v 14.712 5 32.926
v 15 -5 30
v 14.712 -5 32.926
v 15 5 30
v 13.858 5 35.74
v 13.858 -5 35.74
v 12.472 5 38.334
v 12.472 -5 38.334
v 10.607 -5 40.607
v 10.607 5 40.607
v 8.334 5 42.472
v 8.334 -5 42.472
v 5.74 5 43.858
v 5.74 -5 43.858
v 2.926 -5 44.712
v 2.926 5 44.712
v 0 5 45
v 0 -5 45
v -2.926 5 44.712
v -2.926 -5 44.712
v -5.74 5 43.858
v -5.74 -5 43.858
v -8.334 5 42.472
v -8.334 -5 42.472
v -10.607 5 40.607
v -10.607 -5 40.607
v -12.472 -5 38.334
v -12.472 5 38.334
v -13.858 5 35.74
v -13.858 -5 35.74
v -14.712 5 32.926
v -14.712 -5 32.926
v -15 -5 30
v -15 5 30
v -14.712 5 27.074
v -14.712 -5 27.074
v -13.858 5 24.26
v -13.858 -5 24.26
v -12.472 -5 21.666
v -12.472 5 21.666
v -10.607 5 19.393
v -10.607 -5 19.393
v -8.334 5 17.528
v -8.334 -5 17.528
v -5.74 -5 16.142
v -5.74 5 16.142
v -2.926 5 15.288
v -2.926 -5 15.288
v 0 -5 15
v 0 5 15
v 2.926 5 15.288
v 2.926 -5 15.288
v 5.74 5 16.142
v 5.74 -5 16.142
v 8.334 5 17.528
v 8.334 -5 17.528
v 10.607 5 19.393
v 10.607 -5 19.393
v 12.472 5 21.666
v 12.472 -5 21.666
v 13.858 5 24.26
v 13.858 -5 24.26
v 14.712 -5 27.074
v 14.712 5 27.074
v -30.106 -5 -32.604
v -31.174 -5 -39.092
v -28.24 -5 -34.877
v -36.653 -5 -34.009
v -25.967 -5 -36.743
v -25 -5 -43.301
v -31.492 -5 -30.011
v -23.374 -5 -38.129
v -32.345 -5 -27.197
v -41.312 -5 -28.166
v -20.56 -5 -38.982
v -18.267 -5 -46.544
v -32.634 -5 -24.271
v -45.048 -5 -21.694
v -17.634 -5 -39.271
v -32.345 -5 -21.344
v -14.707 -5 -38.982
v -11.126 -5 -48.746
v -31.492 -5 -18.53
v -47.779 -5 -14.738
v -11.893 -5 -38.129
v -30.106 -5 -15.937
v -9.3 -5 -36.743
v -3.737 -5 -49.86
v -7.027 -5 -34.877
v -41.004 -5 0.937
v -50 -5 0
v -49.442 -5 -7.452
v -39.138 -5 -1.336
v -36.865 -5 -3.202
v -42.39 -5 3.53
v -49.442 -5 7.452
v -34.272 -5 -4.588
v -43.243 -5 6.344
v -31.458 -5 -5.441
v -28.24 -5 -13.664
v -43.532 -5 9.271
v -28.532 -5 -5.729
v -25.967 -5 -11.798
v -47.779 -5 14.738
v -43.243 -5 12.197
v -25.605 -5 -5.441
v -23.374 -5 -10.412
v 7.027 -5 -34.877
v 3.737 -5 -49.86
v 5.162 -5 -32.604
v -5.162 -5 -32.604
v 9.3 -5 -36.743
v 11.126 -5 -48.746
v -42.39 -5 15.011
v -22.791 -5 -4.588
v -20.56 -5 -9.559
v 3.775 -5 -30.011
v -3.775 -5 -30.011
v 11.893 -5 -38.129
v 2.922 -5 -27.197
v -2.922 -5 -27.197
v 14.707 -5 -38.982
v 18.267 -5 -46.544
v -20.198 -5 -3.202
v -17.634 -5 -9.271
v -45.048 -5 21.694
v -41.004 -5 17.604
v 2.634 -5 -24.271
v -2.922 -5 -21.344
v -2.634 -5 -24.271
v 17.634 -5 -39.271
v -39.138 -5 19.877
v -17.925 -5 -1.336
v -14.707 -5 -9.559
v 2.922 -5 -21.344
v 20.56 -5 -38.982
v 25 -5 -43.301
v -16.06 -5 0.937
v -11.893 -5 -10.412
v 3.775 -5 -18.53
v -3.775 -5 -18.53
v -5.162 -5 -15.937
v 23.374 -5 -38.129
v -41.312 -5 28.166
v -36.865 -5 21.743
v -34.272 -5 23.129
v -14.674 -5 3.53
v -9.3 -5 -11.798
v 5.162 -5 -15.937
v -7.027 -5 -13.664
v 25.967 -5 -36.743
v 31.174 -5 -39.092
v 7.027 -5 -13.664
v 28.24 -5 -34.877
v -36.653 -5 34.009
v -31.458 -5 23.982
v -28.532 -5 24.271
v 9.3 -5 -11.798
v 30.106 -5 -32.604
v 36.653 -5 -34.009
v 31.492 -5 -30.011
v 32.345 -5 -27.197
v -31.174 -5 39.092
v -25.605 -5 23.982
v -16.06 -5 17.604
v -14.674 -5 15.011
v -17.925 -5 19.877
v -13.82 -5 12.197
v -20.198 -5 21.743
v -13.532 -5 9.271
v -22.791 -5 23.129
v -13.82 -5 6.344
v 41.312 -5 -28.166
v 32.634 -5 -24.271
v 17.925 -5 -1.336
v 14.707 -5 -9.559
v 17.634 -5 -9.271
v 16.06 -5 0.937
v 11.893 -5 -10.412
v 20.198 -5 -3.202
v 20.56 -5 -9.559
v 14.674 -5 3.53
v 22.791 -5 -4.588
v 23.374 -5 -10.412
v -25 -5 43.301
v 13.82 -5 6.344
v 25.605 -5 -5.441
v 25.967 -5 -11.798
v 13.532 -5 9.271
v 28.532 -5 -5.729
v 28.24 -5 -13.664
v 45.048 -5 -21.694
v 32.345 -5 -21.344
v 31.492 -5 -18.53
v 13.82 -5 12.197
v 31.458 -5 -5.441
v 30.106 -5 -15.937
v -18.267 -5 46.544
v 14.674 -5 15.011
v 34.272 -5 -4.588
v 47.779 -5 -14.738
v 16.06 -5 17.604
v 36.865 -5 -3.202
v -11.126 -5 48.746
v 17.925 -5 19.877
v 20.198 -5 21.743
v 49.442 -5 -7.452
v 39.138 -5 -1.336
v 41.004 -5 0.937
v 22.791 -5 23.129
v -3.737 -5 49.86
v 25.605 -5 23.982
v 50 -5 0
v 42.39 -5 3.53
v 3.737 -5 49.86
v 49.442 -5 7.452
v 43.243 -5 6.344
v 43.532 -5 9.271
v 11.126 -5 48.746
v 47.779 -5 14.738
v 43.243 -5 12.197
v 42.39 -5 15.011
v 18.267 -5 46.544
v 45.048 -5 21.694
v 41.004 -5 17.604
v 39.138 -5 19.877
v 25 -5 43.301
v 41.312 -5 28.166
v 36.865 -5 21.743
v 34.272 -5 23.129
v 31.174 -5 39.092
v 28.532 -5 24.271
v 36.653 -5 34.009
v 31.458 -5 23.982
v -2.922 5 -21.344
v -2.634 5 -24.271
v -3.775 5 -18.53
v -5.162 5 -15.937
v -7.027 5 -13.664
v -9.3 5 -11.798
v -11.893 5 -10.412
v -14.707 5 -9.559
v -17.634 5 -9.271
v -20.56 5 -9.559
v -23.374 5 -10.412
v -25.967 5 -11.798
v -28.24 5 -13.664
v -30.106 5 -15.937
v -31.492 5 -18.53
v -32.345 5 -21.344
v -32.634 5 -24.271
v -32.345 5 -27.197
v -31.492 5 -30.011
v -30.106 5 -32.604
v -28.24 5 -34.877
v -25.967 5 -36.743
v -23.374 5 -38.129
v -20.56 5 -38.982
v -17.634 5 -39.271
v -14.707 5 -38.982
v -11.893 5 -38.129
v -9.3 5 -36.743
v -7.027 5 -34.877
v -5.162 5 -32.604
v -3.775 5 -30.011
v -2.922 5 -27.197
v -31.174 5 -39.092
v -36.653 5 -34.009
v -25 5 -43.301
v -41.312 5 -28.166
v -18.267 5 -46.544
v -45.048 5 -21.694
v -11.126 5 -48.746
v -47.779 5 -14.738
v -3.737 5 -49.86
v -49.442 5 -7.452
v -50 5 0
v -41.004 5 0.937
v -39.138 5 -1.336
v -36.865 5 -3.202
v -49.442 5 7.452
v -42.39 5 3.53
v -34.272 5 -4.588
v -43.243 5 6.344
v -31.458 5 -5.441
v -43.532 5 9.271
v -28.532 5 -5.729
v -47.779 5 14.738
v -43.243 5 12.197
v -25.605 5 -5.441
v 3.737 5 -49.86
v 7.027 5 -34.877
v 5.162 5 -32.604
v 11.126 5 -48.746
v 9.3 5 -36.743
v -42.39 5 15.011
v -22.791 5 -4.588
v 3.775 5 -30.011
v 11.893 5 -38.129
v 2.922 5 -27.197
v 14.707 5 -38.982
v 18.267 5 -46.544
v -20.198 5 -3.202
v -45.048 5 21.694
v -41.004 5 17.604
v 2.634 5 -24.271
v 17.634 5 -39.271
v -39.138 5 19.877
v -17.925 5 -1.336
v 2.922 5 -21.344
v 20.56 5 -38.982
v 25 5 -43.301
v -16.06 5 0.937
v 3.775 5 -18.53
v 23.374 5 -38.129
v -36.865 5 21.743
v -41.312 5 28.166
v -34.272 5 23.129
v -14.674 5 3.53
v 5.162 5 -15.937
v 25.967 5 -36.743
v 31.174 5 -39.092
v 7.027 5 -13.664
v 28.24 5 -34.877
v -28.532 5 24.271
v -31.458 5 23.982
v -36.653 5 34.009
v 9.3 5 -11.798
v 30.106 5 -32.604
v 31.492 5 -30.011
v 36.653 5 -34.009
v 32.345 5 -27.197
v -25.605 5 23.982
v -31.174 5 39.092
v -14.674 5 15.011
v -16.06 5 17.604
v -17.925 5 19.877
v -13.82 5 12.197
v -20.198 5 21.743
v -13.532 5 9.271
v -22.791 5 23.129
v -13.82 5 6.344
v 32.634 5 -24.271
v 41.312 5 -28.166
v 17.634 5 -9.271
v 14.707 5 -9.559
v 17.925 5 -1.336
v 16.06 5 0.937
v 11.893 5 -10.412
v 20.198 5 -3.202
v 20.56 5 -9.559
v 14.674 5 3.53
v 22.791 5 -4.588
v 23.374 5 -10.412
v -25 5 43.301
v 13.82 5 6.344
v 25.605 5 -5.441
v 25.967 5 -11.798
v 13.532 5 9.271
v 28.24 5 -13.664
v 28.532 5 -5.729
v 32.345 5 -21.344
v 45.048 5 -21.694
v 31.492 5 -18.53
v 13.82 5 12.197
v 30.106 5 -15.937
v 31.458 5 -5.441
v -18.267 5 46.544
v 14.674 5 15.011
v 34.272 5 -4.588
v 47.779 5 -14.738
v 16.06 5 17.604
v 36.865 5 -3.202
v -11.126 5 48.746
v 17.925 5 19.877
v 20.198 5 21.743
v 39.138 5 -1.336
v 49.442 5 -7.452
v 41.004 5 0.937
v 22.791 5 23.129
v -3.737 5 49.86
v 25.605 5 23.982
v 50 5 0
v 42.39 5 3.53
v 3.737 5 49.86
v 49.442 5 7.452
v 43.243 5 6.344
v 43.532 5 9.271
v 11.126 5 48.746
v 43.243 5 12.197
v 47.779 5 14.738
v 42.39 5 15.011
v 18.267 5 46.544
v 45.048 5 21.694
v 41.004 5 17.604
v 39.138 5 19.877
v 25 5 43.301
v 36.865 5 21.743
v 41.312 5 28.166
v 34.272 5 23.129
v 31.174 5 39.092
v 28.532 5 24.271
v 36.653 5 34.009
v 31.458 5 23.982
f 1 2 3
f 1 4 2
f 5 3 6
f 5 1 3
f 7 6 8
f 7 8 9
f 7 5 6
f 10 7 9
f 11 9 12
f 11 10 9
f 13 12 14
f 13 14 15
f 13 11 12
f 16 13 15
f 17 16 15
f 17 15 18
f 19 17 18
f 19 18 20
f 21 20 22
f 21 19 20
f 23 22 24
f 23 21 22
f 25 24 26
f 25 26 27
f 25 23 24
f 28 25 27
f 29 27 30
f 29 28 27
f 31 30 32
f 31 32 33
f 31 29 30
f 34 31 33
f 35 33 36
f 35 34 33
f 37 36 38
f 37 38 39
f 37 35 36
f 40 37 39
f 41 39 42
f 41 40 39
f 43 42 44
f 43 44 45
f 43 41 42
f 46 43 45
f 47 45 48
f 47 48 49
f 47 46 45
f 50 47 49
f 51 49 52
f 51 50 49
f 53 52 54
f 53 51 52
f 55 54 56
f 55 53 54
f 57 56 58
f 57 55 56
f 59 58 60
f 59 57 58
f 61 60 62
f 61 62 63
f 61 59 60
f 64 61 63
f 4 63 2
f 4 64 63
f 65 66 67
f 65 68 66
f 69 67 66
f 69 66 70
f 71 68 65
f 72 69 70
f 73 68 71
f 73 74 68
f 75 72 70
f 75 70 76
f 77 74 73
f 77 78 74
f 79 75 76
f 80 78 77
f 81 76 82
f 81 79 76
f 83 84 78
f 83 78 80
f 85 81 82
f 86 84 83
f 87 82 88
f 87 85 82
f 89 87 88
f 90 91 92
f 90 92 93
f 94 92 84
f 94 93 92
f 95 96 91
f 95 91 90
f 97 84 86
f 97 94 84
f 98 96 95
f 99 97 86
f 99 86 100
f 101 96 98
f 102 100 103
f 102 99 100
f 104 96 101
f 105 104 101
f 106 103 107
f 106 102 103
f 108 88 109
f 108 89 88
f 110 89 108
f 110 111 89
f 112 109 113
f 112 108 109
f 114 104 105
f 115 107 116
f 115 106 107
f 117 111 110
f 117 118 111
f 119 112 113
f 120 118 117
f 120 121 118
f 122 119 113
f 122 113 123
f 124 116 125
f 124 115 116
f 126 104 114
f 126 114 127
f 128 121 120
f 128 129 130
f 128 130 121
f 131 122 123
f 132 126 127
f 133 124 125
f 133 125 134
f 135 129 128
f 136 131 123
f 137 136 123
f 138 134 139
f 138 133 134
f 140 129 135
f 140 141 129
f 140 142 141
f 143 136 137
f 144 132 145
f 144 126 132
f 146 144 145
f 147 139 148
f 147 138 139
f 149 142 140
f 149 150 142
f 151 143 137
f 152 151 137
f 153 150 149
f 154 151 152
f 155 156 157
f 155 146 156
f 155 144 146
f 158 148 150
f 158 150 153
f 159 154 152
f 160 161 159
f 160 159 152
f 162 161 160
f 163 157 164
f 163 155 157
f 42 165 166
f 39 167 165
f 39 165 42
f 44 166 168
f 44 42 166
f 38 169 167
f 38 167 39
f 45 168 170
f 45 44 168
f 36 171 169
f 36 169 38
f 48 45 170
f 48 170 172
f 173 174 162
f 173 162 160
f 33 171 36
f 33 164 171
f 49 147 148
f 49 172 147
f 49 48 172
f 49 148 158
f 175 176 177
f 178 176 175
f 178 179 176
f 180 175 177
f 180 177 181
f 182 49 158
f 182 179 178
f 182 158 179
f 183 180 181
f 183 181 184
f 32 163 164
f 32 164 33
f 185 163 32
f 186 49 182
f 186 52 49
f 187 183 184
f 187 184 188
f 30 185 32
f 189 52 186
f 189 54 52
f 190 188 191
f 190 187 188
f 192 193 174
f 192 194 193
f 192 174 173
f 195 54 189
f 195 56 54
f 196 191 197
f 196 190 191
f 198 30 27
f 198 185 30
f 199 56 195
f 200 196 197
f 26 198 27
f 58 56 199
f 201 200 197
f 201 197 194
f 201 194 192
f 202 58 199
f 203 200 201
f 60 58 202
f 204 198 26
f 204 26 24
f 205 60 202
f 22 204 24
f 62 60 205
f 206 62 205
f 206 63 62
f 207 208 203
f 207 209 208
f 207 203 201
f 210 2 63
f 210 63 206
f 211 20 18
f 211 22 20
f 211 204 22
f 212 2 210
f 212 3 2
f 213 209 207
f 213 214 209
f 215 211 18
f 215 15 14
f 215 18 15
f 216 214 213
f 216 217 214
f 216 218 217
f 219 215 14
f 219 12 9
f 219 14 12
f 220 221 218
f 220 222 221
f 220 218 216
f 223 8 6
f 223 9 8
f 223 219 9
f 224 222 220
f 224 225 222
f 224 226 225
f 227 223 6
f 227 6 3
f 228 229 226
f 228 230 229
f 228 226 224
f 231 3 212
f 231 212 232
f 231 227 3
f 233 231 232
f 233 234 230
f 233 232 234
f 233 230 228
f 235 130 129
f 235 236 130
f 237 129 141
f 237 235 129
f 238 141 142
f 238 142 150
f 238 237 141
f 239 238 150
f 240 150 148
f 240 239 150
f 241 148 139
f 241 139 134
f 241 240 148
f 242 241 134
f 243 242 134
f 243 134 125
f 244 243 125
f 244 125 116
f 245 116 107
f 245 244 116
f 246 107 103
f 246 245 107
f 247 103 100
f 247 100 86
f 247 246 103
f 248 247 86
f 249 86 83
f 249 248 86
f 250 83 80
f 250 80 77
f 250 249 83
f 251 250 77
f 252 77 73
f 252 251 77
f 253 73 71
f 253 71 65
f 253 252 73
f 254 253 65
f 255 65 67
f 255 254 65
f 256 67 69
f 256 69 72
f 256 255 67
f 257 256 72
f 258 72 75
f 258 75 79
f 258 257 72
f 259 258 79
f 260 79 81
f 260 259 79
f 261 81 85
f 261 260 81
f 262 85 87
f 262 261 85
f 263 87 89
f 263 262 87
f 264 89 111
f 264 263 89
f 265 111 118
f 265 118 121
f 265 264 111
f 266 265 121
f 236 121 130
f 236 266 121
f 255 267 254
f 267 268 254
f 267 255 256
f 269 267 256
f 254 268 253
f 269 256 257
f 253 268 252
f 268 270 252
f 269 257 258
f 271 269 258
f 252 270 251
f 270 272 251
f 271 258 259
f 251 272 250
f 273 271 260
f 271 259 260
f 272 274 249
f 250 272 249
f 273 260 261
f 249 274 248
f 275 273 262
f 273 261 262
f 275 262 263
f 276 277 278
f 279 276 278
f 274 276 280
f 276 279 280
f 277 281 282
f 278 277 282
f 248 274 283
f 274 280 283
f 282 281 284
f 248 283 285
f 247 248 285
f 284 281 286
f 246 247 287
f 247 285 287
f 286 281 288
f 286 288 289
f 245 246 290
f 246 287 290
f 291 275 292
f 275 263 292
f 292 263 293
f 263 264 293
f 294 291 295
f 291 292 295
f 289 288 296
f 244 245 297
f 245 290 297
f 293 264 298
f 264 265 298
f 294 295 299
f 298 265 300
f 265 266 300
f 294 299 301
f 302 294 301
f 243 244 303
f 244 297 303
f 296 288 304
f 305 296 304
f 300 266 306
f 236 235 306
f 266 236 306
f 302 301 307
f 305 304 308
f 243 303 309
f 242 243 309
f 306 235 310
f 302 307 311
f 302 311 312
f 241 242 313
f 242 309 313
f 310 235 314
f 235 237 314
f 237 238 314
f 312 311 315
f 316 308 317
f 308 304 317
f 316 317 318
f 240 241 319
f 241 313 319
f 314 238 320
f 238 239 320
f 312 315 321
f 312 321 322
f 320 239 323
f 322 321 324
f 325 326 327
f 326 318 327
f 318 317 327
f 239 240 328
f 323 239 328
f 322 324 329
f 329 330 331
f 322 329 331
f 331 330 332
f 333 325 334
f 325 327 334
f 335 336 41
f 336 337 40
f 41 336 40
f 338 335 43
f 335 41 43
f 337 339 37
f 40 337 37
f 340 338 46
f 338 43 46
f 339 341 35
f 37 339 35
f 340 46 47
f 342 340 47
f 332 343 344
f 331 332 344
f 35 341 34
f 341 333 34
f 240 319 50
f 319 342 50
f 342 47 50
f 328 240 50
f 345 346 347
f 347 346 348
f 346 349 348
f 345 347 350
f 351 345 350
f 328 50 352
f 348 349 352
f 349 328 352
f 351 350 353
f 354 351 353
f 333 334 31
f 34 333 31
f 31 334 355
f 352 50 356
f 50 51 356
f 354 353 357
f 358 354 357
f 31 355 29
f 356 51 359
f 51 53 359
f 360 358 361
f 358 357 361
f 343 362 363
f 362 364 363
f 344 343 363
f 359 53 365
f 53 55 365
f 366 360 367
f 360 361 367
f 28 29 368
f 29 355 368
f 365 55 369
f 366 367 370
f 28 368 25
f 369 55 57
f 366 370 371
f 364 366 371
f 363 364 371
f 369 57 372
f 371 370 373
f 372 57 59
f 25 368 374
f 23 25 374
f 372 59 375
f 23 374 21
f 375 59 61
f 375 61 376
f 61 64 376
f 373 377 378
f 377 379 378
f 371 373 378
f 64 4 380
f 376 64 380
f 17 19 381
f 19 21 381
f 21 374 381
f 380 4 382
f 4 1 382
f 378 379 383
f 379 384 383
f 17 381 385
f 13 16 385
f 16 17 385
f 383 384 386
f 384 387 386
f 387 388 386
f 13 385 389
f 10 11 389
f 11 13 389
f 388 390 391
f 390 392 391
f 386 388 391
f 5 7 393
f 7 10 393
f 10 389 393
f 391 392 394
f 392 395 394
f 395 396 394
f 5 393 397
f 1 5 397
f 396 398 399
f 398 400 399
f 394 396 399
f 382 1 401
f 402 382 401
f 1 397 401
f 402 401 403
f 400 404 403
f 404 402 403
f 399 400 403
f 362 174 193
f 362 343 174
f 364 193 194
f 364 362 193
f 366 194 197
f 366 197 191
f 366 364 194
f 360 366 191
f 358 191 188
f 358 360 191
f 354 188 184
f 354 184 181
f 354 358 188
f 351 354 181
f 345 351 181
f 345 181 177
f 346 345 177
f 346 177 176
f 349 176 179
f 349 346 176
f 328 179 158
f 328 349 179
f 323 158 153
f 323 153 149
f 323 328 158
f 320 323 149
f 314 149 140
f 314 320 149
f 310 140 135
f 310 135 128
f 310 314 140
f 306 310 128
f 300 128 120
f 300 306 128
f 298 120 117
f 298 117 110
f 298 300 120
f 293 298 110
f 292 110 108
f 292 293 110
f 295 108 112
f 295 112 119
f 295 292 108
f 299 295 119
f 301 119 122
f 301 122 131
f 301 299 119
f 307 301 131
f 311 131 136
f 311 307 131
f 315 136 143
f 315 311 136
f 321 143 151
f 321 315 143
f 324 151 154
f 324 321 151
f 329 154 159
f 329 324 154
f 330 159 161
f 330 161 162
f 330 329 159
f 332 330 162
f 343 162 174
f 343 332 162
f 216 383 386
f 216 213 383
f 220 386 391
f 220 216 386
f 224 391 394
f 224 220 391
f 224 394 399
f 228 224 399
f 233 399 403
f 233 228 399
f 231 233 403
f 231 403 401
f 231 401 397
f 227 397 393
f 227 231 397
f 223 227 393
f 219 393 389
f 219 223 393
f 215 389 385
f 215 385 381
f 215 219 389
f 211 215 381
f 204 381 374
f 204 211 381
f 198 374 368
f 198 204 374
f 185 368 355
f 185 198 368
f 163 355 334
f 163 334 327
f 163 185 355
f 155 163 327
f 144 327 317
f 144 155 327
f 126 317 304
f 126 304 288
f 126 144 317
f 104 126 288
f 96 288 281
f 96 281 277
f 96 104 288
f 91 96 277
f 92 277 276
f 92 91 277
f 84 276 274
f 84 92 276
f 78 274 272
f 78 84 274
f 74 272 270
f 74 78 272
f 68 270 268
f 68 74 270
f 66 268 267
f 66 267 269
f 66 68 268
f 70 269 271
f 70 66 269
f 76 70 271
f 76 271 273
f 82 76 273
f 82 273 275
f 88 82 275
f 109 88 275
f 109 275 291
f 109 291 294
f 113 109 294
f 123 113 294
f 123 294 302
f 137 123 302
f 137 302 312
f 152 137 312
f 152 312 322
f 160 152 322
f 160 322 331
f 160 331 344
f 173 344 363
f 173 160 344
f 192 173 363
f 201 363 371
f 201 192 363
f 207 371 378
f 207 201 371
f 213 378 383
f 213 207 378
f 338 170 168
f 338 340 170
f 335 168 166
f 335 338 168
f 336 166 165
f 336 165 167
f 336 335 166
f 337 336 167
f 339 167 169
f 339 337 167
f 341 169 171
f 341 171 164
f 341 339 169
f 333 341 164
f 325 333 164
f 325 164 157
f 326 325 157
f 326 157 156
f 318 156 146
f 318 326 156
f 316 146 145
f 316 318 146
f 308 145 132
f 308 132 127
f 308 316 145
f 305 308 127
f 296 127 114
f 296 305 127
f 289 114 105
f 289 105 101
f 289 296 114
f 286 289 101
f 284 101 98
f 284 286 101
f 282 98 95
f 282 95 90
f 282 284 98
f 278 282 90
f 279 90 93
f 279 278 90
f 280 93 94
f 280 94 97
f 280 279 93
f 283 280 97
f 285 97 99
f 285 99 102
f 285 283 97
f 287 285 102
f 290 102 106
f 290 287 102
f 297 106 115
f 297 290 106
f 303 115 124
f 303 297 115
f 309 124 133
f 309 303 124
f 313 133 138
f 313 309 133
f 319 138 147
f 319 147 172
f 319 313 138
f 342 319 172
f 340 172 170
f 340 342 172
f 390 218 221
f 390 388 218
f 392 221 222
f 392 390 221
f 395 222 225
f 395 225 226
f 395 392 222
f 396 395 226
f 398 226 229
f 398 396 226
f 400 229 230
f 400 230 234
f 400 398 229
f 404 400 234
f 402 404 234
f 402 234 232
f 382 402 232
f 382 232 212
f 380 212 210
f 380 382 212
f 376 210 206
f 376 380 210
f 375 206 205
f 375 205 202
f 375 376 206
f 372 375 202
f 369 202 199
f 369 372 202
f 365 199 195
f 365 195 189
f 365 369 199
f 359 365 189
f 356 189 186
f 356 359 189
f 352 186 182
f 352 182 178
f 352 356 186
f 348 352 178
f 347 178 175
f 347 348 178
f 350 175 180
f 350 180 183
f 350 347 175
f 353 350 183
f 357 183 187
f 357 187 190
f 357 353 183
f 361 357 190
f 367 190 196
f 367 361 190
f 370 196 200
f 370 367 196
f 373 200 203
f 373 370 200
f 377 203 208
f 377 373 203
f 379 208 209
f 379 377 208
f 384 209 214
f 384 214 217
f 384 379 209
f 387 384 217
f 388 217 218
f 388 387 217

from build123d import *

# Parameters (mm, degrees)
F0_R     = 50
F0_R_2   = 15
F1_DEPTH = 5


with BuildPart() as f1:
    # F0 (on Front) → F1 (new body, symmetric)
    with BuildSketch(Plane.XZ):
        Circle(F0_R)
        with Locations((-17.6335575688, -24.2705098312)):
            Circle(F0_R_2, mode=Mode.SUBTRACT)
        with Locations((17.6335575688, -24.2705098312)):
            Circle(F0_R_2, mode=Mode.SUBTRACT)
        with Locations((-28.5316954889, 9.2705098312)):
            Circle(F0_R_2, mode=Mode.SUBTRACT)
        with Locations((28.5316954889, 9.2705098312)):
            Circle(F0_R_2, mode=Mode.SUBTRACT)
        with Locations((0, 30)):
            Circle(F0_R_2, mode=Mode.SUBTRACT)
    extrude(amount=F1_DEPTH, both=True)


solid = f1.part
